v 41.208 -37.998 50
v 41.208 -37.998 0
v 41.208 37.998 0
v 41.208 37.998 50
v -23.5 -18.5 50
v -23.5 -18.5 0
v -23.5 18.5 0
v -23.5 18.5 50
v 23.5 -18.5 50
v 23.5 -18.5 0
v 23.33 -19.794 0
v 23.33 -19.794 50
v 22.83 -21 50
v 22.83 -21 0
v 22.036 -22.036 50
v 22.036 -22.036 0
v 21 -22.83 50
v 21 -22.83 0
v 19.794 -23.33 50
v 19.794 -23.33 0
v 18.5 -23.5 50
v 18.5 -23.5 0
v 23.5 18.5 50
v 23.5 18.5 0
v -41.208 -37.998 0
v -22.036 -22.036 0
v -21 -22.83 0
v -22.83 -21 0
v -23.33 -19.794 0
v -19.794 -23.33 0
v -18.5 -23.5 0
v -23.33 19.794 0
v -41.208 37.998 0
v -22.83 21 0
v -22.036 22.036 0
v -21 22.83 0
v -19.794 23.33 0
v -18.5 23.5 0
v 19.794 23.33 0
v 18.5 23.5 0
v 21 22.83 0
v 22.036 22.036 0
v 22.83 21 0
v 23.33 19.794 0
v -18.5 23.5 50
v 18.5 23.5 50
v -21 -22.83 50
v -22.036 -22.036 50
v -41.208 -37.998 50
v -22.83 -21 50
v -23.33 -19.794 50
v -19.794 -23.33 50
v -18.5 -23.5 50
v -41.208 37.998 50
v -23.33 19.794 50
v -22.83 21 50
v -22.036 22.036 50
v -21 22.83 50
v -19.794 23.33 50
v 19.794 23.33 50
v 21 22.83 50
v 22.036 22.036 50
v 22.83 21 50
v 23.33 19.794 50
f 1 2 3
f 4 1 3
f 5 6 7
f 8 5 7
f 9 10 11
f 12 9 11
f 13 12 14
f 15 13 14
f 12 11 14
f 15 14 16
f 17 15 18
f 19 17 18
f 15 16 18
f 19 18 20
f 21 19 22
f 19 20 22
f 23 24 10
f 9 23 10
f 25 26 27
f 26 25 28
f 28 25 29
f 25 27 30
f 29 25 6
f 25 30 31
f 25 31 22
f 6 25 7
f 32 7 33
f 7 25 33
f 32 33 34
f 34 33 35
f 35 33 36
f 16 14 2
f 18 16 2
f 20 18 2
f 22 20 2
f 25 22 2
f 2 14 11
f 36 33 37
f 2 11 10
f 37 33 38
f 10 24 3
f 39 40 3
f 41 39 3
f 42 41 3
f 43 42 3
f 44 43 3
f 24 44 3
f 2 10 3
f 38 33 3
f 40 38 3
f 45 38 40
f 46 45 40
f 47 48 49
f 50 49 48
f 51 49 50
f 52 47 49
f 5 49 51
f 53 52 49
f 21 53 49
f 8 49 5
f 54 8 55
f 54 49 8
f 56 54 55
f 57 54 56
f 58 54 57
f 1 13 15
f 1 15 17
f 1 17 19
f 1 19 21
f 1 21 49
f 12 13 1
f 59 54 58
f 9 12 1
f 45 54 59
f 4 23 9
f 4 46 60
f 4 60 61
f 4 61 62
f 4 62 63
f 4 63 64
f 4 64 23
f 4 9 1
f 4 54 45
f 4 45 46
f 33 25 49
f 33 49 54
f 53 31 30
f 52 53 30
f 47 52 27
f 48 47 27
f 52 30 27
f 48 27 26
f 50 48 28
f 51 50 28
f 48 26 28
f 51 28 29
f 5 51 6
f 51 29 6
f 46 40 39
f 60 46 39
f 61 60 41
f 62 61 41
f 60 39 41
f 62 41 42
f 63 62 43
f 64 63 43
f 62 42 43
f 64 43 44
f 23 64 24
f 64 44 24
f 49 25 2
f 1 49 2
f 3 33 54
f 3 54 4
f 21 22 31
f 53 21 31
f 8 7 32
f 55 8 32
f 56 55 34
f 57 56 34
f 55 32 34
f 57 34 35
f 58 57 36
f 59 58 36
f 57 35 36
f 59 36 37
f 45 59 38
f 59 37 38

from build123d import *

# Parameters (mm, degrees)
F0_W     = 82.416646
F0_H     = 75.996064
F1_DEPTH = 50


with BuildPart() as f1:
    # F0 (on Top) → F1 (new body)
    with BuildSketch(Plane.XY):
        Rectangle(F0_W, F0_H)
        with BuildLine():
            ThreePointArc((23.5, -18.5), (22.035534, -22.035534), (18.5, -23.5))
            Line((18.5, -23.5), (-18.5, -23.5))
            ThreePointArc((-18.5, -23.5), (-22.035534, -22.035534), (-23.5, -18.5))
            Line((-23.5, -18.5), (-23.5, 18.5))
            ThreePointArc((-23.5, 18.5), (-22.035534, 22.035534), (-18.5, 23.5))
            Line((-18.5, 23.5), (18.5, 23.5))
            ThreePointArc((18.5, 23.5), (22.035534, 22.035534), (23.5, 18.5))
            Line((23.5, 18.5), (23.5, -18.5))
        make_face(mode=Mode.SUBTRACT)
    extrude(amount=F1_DEPTH)


solid = f1.part
